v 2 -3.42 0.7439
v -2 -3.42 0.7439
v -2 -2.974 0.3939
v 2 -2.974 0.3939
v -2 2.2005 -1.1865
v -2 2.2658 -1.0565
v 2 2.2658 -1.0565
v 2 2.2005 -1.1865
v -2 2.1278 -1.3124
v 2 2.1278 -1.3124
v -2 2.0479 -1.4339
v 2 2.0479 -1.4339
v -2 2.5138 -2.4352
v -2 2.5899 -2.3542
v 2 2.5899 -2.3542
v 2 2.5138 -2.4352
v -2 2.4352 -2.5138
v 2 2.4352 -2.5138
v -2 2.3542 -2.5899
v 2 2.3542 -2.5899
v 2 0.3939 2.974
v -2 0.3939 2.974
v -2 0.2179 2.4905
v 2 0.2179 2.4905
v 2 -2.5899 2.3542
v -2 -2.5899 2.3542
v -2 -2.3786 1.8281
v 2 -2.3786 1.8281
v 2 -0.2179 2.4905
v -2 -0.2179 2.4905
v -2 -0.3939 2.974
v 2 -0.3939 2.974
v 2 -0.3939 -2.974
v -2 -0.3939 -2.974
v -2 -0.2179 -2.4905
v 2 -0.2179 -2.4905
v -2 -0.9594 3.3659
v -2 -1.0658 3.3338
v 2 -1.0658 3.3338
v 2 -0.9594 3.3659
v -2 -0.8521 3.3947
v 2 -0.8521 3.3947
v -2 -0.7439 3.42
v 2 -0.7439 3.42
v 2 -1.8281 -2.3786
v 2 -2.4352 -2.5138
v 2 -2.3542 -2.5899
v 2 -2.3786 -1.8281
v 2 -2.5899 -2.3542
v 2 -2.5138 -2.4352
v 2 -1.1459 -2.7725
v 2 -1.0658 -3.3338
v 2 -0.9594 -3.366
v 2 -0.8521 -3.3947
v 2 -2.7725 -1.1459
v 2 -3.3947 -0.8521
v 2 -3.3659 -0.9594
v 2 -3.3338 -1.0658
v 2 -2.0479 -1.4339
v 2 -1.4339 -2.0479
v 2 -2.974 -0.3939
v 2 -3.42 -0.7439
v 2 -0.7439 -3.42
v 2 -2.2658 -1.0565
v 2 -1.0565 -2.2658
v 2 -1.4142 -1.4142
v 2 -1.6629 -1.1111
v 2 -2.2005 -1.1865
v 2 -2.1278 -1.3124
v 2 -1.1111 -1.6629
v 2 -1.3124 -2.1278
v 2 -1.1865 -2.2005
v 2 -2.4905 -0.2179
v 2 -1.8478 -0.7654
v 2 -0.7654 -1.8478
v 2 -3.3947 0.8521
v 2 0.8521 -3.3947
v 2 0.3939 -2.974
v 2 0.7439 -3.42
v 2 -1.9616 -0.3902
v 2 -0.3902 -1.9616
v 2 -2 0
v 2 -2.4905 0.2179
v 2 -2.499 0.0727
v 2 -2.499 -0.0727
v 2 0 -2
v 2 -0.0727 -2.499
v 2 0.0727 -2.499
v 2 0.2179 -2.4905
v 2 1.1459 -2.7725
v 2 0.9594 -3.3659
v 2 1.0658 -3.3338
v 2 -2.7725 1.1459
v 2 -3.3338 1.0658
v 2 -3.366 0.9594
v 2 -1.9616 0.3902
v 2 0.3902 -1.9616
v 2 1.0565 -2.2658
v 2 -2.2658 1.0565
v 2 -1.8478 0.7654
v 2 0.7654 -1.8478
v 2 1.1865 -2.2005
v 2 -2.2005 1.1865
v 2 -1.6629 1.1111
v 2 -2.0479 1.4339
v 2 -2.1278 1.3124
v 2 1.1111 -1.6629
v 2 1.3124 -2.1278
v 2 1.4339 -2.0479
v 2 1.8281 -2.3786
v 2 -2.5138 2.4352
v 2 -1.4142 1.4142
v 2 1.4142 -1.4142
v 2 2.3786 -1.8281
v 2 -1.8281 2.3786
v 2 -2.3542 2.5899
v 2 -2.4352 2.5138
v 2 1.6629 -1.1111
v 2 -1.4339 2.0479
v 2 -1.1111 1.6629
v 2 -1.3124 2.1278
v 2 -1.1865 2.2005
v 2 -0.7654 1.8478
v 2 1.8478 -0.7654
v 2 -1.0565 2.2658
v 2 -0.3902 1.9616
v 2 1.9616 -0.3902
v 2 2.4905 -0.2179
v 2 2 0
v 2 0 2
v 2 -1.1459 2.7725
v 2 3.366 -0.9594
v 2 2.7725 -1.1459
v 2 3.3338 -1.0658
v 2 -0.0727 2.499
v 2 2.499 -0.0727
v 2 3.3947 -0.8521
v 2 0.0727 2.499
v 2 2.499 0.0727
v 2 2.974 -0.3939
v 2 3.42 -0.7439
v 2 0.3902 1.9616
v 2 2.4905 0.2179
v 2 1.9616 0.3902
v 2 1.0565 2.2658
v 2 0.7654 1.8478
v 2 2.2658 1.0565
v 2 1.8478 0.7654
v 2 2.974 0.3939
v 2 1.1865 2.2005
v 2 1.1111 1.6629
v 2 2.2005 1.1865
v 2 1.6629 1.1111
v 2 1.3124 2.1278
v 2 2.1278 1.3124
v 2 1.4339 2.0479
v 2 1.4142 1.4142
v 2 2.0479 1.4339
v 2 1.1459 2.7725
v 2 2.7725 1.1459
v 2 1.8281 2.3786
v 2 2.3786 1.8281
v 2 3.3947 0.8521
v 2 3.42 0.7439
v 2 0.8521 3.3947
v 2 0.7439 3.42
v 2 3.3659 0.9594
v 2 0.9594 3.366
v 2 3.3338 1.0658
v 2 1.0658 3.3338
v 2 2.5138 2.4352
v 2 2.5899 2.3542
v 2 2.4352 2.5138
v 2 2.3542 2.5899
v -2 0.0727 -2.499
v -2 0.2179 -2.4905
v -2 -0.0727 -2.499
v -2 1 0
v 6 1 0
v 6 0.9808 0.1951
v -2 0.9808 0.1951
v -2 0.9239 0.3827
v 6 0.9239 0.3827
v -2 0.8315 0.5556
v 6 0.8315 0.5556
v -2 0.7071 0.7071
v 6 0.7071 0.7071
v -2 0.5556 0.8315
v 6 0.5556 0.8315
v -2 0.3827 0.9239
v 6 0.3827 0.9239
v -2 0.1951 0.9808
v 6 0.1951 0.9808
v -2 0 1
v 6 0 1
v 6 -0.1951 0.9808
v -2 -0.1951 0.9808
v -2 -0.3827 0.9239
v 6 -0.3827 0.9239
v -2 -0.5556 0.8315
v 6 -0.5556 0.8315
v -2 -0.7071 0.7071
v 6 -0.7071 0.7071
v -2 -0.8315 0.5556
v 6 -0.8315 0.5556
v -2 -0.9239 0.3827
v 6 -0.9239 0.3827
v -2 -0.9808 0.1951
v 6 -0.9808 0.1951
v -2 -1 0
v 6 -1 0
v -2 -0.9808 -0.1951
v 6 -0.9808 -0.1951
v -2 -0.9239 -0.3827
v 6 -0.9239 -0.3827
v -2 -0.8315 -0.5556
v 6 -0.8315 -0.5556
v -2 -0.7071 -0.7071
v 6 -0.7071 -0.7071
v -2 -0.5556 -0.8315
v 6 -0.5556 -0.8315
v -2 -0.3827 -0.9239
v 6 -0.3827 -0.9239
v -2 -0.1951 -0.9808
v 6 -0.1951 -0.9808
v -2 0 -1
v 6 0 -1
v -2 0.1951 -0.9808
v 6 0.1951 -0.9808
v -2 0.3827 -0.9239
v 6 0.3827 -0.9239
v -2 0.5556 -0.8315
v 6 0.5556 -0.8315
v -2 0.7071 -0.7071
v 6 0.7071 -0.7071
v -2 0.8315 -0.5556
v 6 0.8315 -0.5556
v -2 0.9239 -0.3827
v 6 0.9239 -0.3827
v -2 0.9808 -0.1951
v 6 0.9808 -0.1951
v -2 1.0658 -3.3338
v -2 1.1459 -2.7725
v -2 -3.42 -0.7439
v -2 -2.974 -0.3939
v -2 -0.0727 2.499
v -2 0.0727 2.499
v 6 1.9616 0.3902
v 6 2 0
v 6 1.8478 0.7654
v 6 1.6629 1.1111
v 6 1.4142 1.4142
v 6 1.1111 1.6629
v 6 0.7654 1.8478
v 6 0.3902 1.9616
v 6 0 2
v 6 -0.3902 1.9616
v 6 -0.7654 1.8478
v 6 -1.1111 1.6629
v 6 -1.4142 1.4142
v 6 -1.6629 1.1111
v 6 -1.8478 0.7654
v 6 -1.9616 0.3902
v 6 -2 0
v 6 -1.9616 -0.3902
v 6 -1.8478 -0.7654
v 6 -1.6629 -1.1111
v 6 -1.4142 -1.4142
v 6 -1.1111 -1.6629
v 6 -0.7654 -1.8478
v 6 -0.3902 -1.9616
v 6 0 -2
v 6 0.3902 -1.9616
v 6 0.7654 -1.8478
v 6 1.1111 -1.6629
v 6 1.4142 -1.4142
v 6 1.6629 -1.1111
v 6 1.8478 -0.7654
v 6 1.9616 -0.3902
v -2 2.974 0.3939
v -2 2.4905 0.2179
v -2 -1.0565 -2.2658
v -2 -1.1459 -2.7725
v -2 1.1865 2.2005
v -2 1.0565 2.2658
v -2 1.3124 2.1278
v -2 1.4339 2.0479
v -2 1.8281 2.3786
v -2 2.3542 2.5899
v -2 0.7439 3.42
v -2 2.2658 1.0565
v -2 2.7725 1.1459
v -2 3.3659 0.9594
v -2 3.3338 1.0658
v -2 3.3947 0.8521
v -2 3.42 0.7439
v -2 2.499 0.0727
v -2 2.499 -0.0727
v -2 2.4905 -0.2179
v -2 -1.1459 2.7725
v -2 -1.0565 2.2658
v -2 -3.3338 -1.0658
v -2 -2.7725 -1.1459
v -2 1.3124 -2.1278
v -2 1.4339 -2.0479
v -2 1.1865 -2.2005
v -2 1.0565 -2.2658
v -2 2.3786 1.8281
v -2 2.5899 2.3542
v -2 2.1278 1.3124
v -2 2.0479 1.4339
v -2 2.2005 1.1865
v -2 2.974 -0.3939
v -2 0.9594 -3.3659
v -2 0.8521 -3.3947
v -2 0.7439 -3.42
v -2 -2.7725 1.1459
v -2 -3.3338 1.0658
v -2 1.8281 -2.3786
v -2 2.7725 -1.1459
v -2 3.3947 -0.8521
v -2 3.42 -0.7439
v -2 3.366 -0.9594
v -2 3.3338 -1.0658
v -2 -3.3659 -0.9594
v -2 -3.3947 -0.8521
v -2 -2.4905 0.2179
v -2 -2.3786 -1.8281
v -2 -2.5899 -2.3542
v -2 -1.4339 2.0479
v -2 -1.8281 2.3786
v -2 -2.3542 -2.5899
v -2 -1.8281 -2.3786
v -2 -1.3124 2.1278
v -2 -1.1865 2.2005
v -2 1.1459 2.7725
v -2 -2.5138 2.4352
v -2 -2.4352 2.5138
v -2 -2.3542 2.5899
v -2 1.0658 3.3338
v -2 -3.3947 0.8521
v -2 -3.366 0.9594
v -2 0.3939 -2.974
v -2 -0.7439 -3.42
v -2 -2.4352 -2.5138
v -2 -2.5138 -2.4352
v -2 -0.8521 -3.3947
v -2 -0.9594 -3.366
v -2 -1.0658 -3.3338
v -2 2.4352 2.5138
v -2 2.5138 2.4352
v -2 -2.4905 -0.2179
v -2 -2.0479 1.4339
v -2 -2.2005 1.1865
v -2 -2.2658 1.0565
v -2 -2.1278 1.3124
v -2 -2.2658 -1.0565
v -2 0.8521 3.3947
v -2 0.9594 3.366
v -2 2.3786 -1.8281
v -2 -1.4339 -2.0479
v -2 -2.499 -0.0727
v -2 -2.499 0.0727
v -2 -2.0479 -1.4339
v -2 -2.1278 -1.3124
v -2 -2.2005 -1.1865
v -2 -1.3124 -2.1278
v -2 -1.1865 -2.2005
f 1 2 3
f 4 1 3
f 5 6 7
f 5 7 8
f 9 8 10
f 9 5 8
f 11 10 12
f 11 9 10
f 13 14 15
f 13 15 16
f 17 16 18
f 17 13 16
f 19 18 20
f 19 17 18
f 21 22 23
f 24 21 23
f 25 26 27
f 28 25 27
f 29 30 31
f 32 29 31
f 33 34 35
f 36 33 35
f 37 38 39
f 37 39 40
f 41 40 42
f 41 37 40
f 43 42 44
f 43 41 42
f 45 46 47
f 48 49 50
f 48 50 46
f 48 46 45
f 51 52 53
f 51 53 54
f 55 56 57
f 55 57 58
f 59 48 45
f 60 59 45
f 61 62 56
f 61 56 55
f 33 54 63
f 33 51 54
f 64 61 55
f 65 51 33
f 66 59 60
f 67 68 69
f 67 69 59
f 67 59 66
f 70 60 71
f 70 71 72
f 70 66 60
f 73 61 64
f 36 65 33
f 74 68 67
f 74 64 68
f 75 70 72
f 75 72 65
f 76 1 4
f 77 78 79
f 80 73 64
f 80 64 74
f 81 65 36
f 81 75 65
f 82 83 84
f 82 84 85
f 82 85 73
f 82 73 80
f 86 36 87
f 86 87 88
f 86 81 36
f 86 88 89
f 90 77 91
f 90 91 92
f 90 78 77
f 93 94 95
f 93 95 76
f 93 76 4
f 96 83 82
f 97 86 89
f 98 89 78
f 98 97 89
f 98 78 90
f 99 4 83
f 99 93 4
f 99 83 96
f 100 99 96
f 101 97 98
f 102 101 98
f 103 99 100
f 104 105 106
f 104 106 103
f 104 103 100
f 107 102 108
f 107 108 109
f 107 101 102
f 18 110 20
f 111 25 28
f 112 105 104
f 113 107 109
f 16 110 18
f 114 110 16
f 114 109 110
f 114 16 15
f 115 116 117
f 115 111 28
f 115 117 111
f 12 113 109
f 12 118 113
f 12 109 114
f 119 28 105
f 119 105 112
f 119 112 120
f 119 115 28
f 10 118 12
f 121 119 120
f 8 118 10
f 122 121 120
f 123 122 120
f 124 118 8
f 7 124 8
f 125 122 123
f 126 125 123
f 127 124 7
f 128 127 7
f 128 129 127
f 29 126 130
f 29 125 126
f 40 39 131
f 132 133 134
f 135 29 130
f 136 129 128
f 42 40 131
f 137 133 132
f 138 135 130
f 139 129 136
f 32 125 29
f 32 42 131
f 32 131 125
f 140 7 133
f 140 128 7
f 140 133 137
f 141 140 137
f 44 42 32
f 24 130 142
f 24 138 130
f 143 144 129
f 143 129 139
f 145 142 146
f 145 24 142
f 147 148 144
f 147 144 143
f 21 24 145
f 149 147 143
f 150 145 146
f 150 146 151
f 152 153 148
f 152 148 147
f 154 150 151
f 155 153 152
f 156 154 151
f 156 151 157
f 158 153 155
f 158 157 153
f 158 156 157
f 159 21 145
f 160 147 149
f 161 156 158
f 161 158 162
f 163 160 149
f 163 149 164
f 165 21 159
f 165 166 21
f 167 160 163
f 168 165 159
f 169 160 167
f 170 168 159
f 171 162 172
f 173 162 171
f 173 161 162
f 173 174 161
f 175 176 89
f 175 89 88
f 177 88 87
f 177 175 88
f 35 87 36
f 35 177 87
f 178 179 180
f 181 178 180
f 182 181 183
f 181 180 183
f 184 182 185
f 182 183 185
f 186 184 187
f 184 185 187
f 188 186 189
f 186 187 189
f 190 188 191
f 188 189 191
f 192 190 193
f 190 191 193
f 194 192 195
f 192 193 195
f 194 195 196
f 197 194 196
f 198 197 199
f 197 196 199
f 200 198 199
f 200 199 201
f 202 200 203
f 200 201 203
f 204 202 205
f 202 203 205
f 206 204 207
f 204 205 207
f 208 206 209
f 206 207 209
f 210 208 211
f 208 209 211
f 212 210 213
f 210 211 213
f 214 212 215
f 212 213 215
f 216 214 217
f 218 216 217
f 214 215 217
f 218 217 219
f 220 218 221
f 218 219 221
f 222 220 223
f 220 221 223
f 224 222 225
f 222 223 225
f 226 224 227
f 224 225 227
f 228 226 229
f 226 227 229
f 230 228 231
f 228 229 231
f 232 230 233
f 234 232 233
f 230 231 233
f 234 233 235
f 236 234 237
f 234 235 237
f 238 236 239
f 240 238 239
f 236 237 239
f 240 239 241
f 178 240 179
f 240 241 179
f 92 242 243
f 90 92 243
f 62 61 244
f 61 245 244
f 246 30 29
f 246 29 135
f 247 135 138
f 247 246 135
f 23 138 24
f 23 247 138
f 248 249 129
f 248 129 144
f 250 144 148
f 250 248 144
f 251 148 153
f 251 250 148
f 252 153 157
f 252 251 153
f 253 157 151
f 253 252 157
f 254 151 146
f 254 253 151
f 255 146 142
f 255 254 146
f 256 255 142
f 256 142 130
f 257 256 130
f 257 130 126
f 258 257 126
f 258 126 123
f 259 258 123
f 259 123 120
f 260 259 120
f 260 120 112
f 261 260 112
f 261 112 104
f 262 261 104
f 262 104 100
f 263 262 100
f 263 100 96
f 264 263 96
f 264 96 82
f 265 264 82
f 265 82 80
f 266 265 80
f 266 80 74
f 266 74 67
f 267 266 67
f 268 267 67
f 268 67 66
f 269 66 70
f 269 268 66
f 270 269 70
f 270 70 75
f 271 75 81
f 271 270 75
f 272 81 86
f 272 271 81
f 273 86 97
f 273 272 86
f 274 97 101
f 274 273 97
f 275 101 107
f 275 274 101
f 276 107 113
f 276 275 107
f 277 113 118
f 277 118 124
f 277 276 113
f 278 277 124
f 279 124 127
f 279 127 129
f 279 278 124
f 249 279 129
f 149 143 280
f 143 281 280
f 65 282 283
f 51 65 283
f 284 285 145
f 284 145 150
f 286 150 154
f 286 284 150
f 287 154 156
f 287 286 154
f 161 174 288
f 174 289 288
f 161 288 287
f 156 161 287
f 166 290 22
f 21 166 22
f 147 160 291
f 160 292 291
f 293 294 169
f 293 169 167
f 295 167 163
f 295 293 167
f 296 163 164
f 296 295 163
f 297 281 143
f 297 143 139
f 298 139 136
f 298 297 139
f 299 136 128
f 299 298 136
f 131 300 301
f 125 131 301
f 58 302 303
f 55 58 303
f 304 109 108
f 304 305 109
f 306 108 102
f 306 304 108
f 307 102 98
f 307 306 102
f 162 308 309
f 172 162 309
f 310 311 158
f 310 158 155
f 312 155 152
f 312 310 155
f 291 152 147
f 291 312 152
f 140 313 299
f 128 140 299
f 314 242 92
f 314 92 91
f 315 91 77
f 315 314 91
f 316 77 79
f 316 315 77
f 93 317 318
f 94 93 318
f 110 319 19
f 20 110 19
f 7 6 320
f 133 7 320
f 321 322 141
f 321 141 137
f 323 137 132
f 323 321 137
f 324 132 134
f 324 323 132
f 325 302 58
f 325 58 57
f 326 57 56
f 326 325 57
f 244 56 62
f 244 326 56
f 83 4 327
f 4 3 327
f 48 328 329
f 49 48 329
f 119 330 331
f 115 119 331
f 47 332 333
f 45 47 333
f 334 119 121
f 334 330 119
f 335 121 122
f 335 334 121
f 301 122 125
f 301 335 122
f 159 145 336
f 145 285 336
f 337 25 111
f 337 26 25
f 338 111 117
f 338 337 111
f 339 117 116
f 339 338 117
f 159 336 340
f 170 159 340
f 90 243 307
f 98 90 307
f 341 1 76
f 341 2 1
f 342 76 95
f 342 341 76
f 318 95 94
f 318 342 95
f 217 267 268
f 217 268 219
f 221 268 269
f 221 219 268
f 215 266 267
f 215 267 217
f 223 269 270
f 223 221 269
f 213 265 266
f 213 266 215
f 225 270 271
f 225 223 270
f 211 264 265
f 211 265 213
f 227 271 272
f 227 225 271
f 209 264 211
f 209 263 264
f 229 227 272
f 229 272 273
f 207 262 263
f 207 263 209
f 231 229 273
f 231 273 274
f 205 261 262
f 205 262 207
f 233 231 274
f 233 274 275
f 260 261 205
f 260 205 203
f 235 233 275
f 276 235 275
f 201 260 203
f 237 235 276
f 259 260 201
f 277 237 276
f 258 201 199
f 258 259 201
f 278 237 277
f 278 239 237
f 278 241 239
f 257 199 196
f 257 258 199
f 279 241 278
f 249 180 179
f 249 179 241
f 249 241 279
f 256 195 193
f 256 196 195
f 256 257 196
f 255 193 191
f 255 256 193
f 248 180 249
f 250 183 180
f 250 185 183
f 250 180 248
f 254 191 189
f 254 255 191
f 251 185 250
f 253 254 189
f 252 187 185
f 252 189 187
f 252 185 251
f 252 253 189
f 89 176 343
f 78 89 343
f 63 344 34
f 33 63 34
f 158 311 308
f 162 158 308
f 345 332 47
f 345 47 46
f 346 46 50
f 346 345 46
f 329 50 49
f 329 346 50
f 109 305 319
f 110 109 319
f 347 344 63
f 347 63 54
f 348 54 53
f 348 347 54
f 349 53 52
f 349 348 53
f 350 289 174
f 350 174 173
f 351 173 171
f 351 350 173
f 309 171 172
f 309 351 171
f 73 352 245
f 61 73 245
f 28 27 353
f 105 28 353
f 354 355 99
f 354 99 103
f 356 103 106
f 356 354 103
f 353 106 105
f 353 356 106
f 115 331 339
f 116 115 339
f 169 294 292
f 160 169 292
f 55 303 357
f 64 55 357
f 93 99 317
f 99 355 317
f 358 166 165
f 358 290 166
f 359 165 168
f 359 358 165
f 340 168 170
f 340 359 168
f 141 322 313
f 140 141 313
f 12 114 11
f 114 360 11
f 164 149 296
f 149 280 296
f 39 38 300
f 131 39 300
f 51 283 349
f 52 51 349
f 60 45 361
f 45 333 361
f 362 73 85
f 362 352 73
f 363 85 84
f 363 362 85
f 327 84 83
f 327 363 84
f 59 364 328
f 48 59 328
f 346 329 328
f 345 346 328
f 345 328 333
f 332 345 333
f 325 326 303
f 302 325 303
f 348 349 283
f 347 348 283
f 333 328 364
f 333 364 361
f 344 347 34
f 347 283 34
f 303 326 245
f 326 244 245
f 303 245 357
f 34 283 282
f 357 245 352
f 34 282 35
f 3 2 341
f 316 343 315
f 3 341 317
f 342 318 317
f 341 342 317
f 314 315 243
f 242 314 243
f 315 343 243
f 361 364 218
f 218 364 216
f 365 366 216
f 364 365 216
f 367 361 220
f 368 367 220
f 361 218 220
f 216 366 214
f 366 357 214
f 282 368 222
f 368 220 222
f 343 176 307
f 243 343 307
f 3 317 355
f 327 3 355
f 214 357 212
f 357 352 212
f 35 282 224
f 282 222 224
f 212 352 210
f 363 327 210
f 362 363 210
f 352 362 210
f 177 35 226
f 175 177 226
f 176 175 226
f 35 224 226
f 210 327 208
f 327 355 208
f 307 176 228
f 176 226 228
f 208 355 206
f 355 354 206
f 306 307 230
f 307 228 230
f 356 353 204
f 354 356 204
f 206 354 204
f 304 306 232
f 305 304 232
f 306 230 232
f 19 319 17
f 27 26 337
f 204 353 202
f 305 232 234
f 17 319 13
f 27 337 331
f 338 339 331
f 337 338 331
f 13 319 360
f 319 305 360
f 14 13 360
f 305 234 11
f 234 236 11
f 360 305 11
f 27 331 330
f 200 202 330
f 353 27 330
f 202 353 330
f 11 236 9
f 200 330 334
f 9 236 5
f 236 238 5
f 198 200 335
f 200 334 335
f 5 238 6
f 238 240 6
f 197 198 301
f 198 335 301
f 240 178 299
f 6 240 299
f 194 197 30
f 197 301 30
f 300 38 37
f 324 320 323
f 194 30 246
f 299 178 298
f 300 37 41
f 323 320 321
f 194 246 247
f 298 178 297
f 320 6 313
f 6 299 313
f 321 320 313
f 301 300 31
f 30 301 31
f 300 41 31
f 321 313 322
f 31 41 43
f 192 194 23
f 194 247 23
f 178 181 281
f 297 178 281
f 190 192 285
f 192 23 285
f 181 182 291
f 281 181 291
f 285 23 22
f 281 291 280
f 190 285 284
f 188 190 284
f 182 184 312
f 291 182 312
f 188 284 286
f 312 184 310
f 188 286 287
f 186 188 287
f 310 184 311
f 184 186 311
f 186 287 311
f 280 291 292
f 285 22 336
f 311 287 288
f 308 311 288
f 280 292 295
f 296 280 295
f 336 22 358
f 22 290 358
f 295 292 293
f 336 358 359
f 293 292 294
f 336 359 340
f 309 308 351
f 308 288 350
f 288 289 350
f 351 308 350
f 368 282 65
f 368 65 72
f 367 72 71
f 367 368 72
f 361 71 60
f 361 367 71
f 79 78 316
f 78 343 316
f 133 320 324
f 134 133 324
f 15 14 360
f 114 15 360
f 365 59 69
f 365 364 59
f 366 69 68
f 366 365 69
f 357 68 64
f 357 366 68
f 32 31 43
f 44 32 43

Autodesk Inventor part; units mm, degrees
ref_plane "YZ Plane" through (0, 0, 0) normal (1, 0, 0) x (0, 1, 0)
ref_plane "XZ Plane" through (0, 0, 0) normal (0, 1, 0) x (-1, 0, 0)
ref_plane "XY Plane" through (0, 0, 0) normal (0, 0, 1) x (1, 0, 0)
sketch "Skizze_1" plane through (0, 0, 0) normal (1, 0, 0) x (0, 1, 0)
  arc A0 (-0.7439, 3.42) -> (-1.0658, 3.3338) centre (0, 0) ccw
  line L0 (-1.0658, 3.3338) -> (-1.1459, 2.7725)
  line L1 (-1.1459, 2.7725) -> (-1.0565, 2.2658)
  arc A1 (-1.0565, 2.2658) -> (-1.4339, 2.0479) centre (0, 0) ccw
  line L2 (-1.4339, 2.0479) -> (-1.8281, 2.3786)
  line L3 (-1.8281, 2.3786) -> (-2.3542, 2.5899)
  arc A2 (-2.3542, 2.5899) -> (-2.5899, 2.3542) centre (0, 0) ccw
  line L4 (-2.5899, 2.3542) -> (-2.3786, 1.8281)
  line L5 (-2.3786, 1.8281) -> (-2.0479, 1.4339)
  arc A3 (-2.0479, 1.4339) -> (-2.2658, 1.0565) centre (0, 0) ccw
  line L6 (-2.2658, 1.0565) -> (-2.7725, 1.1459)
  line L7 (-2.7725, 1.1459) -> (-3.3338, 1.0658)
  arc A4 (-3.3338, 1.0658) -> (-3.42, 0.7439) centre (0, 0) ccw
  line L8 (-3.42, 0.7439) -> (-2.974, 0.3939)
  line L9 (-2.974, 0.3939) -> (-2.4905, 0.2179)
  arc A5 (-2.4905, 0.2179) -> (-2.4905, -0.2179) centre (0, 0) ccw
  line L10 (-2.4905, -0.2179) -> (-2.974, -0.3939)
  line L11 (-2.974, -0.3939) -> (-3.42, -0.7439)
  arc A6 (-3.42, -0.7439) -> (-3.3338, -1.0658) centre (0, 0) ccw
  line L12 (-3.3338, -1.0658) -> (-2.7725, -1.1459)
  line L13 (-2.7725, -1.1459) -> (-2.2658, -1.0565)
  arc A7 (-2.2658, -1.0565) -> (-2.0479, -1.4339) centre (0, 0) ccw
  line L14 (-2.0479, -1.4339) -> (-2.3786, -1.8281)
  line L15 (-2.3786, -1.8281) -> (-2.5899, -2.3542)
  arc A8 (-2.5899, -2.3542) -> (-2.3542, -2.5899) centre (0, 0) ccw
  line L16 (-2.3542, -2.5899) -> (-1.8281, -2.3786)
  line L17 (-1.8281, -2.3786) -> (-1.4339, -2.0479)
  arc A9 (-1.4339, -2.0479) -> (-1.0565, -2.2658) centre (0, 0) ccw
  line L18 (-1.0565, -2.2658) -> (-1.1459, -2.7725)
  line L19 (-1.1459, -2.7725) -> (-1.0658, -3.3338)
  arc A10 (-1.0658, -3.3338) -> (-0.7439, -3.42) centre (0, 0) ccw
  line L20 (-0.7439, -3.42) -> (-0.3939, -2.974)
  line L21 (-0.3939, -2.974) -> (-0.2179, -2.4905)
  arc A11 (-0.2179, -2.4905) -> (0.2179, -2.4905) centre (0, 0) ccw
  line L22 (0.2179, -2.4905) -> (0.3939, -2.974)
  line L23 (0.3939, -2.974) -> (0.7439, -3.42)
  arc A12 (0.7439, -3.42) -> (1.0658, -3.3338) centre (0, 0) ccw
  line L24 (1.0658, -3.3338) -> (1.1459, -2.7725)
  line L25 (1.1459, -2.7725) -> (1.0565, -2.2658)
  arc A13 (1.0565, -2.2658) -> (1.4339, -2.0479) centre (0, 0) ccw
  line L26 (1.4339, -2.0479) -> (1.8281, -2.3786)
  line L27 (1.8281, -2.3786) -> (2.3542, -2.5899)
  arc A14 (2.3542, -2.5899) -> (2.5899, -2.3542) centre (0, 0) ccw
  line L28 (2.5899, -2.3542) -> (2.3786, -1.8281)
  line L29 (2.3786, -1.8281) -> (2.0479, -1.4339)
  arc A15 (2.0479, -1.4339) -> (2.2658, -1.0565) centre (0, 0) ccw
  line L30 (2.2658, -1.0565) -> (2.7725, -1.1459)
  line L31 (2.7725, -1.1459) -> (3.3338, -1.0658)
  arc A16 (3.3338, -1.0658) -> (3.42, -0.7439) centre (0, 0) ccw
  line L32 (3.42, -0.7439) -> (2.974, -0.3939)
  line L33 (2.974, -0.3939) -> (2.4905, -0.2179)
  arc A17 (2.4905, -0.2179) -> (2.4905, 0.2179) centre (0, 0) ccw
  line L34 (2.4905, 0.2179) -> (2.974, 0.3939)
  line L35 (2.974, 0.3939) -> (3.42, 0.7439)
  arc A18 (3.42, 0.7439) -> (3.3338, 1.0658) centre (0, 0) ccw
  line L36 (3.3338, 1.0658) -> (2.7725, 1.1459)
  line L37 (2.7725, 1.1459) -> (2.2658, 1.0565)
  arc A19 (2.2658, 1.0565) -> (2.0479, 1.4339) centre (0, 0) ccw
  line L38 (2.0479, 1.4339) -> (2.3786, 1.8281)
  line L39 (2.3786, 1.8281) -> (2.5899, 2.3542)
  arc A20 (2.5899, 2.3542) -> (2.3542, 2.5899) centre (0, 0) ccw
  line L40 (2.3542, 2.5899) -> (1.8281, 2.3786)
  line L41 (1.8281, 2.3786) -> (1.4339, 2.0479)
  arc A21 (1.4339, 2.0479) -> (1.0565, 2.2658) centre (0, 0) ccw
  line L42 (1.0565, 2.2658) -> (1.1459, 2.7725)
  line L43 (1.1459, 2.7725) -> (1.0658, 3.3338)
  arc A22 (1.0658, 3.3338) -> (0.7439, 3.42) centre (0, 0) ccw
  line L44 (0.7439, 3.42) -> (0.3939, 2.974)
  line L45 (0.3939, 2.974) -> (0.2179, 2.4905)
  arc A23 (0.2179, 2.4905) -> (-0.2179, 2.4905) centre (0, 0) ccw
  line L46 (-0.2179, 2.4905) -> (-0.3939, 2.974)
  line L47 (-0.3939, 2.974) -> (-0.7439, 3.42)
extrude "Extrusion1" add sketch "Skizze_1" along normal mid plane 4
sketch "Skizze_2" plane through (0, 0, 0) normal (0, 0, 1) x (1, 0, 0)
  line L0 (6, 0) -> (2, 0)
  line L1 (2, 0) -> (2, 2)
  line L2 (2, 2) -> (6, 2)
  line L3 (6, 2) -> (6, 0)
  line L4 (6, 0) -> (2, 0)
revolve "Revolution1" add sketch "Skizze_2" angle 360 about axis through (6, 0, 0) along (1, 0, 0)
sketch "Skizze_3" plane through (6, 0, 0) normal (1, 0, 0) x (0, 1, 0)
  circle A0 centre (0, 0) radius 1
extrude "Extrusion2" cut sketch "Skizze_3" along normal mid plane 16
properties part number "M-0.5 Zb-4mm M-0.7 Zb-5mm mN 21101200"
